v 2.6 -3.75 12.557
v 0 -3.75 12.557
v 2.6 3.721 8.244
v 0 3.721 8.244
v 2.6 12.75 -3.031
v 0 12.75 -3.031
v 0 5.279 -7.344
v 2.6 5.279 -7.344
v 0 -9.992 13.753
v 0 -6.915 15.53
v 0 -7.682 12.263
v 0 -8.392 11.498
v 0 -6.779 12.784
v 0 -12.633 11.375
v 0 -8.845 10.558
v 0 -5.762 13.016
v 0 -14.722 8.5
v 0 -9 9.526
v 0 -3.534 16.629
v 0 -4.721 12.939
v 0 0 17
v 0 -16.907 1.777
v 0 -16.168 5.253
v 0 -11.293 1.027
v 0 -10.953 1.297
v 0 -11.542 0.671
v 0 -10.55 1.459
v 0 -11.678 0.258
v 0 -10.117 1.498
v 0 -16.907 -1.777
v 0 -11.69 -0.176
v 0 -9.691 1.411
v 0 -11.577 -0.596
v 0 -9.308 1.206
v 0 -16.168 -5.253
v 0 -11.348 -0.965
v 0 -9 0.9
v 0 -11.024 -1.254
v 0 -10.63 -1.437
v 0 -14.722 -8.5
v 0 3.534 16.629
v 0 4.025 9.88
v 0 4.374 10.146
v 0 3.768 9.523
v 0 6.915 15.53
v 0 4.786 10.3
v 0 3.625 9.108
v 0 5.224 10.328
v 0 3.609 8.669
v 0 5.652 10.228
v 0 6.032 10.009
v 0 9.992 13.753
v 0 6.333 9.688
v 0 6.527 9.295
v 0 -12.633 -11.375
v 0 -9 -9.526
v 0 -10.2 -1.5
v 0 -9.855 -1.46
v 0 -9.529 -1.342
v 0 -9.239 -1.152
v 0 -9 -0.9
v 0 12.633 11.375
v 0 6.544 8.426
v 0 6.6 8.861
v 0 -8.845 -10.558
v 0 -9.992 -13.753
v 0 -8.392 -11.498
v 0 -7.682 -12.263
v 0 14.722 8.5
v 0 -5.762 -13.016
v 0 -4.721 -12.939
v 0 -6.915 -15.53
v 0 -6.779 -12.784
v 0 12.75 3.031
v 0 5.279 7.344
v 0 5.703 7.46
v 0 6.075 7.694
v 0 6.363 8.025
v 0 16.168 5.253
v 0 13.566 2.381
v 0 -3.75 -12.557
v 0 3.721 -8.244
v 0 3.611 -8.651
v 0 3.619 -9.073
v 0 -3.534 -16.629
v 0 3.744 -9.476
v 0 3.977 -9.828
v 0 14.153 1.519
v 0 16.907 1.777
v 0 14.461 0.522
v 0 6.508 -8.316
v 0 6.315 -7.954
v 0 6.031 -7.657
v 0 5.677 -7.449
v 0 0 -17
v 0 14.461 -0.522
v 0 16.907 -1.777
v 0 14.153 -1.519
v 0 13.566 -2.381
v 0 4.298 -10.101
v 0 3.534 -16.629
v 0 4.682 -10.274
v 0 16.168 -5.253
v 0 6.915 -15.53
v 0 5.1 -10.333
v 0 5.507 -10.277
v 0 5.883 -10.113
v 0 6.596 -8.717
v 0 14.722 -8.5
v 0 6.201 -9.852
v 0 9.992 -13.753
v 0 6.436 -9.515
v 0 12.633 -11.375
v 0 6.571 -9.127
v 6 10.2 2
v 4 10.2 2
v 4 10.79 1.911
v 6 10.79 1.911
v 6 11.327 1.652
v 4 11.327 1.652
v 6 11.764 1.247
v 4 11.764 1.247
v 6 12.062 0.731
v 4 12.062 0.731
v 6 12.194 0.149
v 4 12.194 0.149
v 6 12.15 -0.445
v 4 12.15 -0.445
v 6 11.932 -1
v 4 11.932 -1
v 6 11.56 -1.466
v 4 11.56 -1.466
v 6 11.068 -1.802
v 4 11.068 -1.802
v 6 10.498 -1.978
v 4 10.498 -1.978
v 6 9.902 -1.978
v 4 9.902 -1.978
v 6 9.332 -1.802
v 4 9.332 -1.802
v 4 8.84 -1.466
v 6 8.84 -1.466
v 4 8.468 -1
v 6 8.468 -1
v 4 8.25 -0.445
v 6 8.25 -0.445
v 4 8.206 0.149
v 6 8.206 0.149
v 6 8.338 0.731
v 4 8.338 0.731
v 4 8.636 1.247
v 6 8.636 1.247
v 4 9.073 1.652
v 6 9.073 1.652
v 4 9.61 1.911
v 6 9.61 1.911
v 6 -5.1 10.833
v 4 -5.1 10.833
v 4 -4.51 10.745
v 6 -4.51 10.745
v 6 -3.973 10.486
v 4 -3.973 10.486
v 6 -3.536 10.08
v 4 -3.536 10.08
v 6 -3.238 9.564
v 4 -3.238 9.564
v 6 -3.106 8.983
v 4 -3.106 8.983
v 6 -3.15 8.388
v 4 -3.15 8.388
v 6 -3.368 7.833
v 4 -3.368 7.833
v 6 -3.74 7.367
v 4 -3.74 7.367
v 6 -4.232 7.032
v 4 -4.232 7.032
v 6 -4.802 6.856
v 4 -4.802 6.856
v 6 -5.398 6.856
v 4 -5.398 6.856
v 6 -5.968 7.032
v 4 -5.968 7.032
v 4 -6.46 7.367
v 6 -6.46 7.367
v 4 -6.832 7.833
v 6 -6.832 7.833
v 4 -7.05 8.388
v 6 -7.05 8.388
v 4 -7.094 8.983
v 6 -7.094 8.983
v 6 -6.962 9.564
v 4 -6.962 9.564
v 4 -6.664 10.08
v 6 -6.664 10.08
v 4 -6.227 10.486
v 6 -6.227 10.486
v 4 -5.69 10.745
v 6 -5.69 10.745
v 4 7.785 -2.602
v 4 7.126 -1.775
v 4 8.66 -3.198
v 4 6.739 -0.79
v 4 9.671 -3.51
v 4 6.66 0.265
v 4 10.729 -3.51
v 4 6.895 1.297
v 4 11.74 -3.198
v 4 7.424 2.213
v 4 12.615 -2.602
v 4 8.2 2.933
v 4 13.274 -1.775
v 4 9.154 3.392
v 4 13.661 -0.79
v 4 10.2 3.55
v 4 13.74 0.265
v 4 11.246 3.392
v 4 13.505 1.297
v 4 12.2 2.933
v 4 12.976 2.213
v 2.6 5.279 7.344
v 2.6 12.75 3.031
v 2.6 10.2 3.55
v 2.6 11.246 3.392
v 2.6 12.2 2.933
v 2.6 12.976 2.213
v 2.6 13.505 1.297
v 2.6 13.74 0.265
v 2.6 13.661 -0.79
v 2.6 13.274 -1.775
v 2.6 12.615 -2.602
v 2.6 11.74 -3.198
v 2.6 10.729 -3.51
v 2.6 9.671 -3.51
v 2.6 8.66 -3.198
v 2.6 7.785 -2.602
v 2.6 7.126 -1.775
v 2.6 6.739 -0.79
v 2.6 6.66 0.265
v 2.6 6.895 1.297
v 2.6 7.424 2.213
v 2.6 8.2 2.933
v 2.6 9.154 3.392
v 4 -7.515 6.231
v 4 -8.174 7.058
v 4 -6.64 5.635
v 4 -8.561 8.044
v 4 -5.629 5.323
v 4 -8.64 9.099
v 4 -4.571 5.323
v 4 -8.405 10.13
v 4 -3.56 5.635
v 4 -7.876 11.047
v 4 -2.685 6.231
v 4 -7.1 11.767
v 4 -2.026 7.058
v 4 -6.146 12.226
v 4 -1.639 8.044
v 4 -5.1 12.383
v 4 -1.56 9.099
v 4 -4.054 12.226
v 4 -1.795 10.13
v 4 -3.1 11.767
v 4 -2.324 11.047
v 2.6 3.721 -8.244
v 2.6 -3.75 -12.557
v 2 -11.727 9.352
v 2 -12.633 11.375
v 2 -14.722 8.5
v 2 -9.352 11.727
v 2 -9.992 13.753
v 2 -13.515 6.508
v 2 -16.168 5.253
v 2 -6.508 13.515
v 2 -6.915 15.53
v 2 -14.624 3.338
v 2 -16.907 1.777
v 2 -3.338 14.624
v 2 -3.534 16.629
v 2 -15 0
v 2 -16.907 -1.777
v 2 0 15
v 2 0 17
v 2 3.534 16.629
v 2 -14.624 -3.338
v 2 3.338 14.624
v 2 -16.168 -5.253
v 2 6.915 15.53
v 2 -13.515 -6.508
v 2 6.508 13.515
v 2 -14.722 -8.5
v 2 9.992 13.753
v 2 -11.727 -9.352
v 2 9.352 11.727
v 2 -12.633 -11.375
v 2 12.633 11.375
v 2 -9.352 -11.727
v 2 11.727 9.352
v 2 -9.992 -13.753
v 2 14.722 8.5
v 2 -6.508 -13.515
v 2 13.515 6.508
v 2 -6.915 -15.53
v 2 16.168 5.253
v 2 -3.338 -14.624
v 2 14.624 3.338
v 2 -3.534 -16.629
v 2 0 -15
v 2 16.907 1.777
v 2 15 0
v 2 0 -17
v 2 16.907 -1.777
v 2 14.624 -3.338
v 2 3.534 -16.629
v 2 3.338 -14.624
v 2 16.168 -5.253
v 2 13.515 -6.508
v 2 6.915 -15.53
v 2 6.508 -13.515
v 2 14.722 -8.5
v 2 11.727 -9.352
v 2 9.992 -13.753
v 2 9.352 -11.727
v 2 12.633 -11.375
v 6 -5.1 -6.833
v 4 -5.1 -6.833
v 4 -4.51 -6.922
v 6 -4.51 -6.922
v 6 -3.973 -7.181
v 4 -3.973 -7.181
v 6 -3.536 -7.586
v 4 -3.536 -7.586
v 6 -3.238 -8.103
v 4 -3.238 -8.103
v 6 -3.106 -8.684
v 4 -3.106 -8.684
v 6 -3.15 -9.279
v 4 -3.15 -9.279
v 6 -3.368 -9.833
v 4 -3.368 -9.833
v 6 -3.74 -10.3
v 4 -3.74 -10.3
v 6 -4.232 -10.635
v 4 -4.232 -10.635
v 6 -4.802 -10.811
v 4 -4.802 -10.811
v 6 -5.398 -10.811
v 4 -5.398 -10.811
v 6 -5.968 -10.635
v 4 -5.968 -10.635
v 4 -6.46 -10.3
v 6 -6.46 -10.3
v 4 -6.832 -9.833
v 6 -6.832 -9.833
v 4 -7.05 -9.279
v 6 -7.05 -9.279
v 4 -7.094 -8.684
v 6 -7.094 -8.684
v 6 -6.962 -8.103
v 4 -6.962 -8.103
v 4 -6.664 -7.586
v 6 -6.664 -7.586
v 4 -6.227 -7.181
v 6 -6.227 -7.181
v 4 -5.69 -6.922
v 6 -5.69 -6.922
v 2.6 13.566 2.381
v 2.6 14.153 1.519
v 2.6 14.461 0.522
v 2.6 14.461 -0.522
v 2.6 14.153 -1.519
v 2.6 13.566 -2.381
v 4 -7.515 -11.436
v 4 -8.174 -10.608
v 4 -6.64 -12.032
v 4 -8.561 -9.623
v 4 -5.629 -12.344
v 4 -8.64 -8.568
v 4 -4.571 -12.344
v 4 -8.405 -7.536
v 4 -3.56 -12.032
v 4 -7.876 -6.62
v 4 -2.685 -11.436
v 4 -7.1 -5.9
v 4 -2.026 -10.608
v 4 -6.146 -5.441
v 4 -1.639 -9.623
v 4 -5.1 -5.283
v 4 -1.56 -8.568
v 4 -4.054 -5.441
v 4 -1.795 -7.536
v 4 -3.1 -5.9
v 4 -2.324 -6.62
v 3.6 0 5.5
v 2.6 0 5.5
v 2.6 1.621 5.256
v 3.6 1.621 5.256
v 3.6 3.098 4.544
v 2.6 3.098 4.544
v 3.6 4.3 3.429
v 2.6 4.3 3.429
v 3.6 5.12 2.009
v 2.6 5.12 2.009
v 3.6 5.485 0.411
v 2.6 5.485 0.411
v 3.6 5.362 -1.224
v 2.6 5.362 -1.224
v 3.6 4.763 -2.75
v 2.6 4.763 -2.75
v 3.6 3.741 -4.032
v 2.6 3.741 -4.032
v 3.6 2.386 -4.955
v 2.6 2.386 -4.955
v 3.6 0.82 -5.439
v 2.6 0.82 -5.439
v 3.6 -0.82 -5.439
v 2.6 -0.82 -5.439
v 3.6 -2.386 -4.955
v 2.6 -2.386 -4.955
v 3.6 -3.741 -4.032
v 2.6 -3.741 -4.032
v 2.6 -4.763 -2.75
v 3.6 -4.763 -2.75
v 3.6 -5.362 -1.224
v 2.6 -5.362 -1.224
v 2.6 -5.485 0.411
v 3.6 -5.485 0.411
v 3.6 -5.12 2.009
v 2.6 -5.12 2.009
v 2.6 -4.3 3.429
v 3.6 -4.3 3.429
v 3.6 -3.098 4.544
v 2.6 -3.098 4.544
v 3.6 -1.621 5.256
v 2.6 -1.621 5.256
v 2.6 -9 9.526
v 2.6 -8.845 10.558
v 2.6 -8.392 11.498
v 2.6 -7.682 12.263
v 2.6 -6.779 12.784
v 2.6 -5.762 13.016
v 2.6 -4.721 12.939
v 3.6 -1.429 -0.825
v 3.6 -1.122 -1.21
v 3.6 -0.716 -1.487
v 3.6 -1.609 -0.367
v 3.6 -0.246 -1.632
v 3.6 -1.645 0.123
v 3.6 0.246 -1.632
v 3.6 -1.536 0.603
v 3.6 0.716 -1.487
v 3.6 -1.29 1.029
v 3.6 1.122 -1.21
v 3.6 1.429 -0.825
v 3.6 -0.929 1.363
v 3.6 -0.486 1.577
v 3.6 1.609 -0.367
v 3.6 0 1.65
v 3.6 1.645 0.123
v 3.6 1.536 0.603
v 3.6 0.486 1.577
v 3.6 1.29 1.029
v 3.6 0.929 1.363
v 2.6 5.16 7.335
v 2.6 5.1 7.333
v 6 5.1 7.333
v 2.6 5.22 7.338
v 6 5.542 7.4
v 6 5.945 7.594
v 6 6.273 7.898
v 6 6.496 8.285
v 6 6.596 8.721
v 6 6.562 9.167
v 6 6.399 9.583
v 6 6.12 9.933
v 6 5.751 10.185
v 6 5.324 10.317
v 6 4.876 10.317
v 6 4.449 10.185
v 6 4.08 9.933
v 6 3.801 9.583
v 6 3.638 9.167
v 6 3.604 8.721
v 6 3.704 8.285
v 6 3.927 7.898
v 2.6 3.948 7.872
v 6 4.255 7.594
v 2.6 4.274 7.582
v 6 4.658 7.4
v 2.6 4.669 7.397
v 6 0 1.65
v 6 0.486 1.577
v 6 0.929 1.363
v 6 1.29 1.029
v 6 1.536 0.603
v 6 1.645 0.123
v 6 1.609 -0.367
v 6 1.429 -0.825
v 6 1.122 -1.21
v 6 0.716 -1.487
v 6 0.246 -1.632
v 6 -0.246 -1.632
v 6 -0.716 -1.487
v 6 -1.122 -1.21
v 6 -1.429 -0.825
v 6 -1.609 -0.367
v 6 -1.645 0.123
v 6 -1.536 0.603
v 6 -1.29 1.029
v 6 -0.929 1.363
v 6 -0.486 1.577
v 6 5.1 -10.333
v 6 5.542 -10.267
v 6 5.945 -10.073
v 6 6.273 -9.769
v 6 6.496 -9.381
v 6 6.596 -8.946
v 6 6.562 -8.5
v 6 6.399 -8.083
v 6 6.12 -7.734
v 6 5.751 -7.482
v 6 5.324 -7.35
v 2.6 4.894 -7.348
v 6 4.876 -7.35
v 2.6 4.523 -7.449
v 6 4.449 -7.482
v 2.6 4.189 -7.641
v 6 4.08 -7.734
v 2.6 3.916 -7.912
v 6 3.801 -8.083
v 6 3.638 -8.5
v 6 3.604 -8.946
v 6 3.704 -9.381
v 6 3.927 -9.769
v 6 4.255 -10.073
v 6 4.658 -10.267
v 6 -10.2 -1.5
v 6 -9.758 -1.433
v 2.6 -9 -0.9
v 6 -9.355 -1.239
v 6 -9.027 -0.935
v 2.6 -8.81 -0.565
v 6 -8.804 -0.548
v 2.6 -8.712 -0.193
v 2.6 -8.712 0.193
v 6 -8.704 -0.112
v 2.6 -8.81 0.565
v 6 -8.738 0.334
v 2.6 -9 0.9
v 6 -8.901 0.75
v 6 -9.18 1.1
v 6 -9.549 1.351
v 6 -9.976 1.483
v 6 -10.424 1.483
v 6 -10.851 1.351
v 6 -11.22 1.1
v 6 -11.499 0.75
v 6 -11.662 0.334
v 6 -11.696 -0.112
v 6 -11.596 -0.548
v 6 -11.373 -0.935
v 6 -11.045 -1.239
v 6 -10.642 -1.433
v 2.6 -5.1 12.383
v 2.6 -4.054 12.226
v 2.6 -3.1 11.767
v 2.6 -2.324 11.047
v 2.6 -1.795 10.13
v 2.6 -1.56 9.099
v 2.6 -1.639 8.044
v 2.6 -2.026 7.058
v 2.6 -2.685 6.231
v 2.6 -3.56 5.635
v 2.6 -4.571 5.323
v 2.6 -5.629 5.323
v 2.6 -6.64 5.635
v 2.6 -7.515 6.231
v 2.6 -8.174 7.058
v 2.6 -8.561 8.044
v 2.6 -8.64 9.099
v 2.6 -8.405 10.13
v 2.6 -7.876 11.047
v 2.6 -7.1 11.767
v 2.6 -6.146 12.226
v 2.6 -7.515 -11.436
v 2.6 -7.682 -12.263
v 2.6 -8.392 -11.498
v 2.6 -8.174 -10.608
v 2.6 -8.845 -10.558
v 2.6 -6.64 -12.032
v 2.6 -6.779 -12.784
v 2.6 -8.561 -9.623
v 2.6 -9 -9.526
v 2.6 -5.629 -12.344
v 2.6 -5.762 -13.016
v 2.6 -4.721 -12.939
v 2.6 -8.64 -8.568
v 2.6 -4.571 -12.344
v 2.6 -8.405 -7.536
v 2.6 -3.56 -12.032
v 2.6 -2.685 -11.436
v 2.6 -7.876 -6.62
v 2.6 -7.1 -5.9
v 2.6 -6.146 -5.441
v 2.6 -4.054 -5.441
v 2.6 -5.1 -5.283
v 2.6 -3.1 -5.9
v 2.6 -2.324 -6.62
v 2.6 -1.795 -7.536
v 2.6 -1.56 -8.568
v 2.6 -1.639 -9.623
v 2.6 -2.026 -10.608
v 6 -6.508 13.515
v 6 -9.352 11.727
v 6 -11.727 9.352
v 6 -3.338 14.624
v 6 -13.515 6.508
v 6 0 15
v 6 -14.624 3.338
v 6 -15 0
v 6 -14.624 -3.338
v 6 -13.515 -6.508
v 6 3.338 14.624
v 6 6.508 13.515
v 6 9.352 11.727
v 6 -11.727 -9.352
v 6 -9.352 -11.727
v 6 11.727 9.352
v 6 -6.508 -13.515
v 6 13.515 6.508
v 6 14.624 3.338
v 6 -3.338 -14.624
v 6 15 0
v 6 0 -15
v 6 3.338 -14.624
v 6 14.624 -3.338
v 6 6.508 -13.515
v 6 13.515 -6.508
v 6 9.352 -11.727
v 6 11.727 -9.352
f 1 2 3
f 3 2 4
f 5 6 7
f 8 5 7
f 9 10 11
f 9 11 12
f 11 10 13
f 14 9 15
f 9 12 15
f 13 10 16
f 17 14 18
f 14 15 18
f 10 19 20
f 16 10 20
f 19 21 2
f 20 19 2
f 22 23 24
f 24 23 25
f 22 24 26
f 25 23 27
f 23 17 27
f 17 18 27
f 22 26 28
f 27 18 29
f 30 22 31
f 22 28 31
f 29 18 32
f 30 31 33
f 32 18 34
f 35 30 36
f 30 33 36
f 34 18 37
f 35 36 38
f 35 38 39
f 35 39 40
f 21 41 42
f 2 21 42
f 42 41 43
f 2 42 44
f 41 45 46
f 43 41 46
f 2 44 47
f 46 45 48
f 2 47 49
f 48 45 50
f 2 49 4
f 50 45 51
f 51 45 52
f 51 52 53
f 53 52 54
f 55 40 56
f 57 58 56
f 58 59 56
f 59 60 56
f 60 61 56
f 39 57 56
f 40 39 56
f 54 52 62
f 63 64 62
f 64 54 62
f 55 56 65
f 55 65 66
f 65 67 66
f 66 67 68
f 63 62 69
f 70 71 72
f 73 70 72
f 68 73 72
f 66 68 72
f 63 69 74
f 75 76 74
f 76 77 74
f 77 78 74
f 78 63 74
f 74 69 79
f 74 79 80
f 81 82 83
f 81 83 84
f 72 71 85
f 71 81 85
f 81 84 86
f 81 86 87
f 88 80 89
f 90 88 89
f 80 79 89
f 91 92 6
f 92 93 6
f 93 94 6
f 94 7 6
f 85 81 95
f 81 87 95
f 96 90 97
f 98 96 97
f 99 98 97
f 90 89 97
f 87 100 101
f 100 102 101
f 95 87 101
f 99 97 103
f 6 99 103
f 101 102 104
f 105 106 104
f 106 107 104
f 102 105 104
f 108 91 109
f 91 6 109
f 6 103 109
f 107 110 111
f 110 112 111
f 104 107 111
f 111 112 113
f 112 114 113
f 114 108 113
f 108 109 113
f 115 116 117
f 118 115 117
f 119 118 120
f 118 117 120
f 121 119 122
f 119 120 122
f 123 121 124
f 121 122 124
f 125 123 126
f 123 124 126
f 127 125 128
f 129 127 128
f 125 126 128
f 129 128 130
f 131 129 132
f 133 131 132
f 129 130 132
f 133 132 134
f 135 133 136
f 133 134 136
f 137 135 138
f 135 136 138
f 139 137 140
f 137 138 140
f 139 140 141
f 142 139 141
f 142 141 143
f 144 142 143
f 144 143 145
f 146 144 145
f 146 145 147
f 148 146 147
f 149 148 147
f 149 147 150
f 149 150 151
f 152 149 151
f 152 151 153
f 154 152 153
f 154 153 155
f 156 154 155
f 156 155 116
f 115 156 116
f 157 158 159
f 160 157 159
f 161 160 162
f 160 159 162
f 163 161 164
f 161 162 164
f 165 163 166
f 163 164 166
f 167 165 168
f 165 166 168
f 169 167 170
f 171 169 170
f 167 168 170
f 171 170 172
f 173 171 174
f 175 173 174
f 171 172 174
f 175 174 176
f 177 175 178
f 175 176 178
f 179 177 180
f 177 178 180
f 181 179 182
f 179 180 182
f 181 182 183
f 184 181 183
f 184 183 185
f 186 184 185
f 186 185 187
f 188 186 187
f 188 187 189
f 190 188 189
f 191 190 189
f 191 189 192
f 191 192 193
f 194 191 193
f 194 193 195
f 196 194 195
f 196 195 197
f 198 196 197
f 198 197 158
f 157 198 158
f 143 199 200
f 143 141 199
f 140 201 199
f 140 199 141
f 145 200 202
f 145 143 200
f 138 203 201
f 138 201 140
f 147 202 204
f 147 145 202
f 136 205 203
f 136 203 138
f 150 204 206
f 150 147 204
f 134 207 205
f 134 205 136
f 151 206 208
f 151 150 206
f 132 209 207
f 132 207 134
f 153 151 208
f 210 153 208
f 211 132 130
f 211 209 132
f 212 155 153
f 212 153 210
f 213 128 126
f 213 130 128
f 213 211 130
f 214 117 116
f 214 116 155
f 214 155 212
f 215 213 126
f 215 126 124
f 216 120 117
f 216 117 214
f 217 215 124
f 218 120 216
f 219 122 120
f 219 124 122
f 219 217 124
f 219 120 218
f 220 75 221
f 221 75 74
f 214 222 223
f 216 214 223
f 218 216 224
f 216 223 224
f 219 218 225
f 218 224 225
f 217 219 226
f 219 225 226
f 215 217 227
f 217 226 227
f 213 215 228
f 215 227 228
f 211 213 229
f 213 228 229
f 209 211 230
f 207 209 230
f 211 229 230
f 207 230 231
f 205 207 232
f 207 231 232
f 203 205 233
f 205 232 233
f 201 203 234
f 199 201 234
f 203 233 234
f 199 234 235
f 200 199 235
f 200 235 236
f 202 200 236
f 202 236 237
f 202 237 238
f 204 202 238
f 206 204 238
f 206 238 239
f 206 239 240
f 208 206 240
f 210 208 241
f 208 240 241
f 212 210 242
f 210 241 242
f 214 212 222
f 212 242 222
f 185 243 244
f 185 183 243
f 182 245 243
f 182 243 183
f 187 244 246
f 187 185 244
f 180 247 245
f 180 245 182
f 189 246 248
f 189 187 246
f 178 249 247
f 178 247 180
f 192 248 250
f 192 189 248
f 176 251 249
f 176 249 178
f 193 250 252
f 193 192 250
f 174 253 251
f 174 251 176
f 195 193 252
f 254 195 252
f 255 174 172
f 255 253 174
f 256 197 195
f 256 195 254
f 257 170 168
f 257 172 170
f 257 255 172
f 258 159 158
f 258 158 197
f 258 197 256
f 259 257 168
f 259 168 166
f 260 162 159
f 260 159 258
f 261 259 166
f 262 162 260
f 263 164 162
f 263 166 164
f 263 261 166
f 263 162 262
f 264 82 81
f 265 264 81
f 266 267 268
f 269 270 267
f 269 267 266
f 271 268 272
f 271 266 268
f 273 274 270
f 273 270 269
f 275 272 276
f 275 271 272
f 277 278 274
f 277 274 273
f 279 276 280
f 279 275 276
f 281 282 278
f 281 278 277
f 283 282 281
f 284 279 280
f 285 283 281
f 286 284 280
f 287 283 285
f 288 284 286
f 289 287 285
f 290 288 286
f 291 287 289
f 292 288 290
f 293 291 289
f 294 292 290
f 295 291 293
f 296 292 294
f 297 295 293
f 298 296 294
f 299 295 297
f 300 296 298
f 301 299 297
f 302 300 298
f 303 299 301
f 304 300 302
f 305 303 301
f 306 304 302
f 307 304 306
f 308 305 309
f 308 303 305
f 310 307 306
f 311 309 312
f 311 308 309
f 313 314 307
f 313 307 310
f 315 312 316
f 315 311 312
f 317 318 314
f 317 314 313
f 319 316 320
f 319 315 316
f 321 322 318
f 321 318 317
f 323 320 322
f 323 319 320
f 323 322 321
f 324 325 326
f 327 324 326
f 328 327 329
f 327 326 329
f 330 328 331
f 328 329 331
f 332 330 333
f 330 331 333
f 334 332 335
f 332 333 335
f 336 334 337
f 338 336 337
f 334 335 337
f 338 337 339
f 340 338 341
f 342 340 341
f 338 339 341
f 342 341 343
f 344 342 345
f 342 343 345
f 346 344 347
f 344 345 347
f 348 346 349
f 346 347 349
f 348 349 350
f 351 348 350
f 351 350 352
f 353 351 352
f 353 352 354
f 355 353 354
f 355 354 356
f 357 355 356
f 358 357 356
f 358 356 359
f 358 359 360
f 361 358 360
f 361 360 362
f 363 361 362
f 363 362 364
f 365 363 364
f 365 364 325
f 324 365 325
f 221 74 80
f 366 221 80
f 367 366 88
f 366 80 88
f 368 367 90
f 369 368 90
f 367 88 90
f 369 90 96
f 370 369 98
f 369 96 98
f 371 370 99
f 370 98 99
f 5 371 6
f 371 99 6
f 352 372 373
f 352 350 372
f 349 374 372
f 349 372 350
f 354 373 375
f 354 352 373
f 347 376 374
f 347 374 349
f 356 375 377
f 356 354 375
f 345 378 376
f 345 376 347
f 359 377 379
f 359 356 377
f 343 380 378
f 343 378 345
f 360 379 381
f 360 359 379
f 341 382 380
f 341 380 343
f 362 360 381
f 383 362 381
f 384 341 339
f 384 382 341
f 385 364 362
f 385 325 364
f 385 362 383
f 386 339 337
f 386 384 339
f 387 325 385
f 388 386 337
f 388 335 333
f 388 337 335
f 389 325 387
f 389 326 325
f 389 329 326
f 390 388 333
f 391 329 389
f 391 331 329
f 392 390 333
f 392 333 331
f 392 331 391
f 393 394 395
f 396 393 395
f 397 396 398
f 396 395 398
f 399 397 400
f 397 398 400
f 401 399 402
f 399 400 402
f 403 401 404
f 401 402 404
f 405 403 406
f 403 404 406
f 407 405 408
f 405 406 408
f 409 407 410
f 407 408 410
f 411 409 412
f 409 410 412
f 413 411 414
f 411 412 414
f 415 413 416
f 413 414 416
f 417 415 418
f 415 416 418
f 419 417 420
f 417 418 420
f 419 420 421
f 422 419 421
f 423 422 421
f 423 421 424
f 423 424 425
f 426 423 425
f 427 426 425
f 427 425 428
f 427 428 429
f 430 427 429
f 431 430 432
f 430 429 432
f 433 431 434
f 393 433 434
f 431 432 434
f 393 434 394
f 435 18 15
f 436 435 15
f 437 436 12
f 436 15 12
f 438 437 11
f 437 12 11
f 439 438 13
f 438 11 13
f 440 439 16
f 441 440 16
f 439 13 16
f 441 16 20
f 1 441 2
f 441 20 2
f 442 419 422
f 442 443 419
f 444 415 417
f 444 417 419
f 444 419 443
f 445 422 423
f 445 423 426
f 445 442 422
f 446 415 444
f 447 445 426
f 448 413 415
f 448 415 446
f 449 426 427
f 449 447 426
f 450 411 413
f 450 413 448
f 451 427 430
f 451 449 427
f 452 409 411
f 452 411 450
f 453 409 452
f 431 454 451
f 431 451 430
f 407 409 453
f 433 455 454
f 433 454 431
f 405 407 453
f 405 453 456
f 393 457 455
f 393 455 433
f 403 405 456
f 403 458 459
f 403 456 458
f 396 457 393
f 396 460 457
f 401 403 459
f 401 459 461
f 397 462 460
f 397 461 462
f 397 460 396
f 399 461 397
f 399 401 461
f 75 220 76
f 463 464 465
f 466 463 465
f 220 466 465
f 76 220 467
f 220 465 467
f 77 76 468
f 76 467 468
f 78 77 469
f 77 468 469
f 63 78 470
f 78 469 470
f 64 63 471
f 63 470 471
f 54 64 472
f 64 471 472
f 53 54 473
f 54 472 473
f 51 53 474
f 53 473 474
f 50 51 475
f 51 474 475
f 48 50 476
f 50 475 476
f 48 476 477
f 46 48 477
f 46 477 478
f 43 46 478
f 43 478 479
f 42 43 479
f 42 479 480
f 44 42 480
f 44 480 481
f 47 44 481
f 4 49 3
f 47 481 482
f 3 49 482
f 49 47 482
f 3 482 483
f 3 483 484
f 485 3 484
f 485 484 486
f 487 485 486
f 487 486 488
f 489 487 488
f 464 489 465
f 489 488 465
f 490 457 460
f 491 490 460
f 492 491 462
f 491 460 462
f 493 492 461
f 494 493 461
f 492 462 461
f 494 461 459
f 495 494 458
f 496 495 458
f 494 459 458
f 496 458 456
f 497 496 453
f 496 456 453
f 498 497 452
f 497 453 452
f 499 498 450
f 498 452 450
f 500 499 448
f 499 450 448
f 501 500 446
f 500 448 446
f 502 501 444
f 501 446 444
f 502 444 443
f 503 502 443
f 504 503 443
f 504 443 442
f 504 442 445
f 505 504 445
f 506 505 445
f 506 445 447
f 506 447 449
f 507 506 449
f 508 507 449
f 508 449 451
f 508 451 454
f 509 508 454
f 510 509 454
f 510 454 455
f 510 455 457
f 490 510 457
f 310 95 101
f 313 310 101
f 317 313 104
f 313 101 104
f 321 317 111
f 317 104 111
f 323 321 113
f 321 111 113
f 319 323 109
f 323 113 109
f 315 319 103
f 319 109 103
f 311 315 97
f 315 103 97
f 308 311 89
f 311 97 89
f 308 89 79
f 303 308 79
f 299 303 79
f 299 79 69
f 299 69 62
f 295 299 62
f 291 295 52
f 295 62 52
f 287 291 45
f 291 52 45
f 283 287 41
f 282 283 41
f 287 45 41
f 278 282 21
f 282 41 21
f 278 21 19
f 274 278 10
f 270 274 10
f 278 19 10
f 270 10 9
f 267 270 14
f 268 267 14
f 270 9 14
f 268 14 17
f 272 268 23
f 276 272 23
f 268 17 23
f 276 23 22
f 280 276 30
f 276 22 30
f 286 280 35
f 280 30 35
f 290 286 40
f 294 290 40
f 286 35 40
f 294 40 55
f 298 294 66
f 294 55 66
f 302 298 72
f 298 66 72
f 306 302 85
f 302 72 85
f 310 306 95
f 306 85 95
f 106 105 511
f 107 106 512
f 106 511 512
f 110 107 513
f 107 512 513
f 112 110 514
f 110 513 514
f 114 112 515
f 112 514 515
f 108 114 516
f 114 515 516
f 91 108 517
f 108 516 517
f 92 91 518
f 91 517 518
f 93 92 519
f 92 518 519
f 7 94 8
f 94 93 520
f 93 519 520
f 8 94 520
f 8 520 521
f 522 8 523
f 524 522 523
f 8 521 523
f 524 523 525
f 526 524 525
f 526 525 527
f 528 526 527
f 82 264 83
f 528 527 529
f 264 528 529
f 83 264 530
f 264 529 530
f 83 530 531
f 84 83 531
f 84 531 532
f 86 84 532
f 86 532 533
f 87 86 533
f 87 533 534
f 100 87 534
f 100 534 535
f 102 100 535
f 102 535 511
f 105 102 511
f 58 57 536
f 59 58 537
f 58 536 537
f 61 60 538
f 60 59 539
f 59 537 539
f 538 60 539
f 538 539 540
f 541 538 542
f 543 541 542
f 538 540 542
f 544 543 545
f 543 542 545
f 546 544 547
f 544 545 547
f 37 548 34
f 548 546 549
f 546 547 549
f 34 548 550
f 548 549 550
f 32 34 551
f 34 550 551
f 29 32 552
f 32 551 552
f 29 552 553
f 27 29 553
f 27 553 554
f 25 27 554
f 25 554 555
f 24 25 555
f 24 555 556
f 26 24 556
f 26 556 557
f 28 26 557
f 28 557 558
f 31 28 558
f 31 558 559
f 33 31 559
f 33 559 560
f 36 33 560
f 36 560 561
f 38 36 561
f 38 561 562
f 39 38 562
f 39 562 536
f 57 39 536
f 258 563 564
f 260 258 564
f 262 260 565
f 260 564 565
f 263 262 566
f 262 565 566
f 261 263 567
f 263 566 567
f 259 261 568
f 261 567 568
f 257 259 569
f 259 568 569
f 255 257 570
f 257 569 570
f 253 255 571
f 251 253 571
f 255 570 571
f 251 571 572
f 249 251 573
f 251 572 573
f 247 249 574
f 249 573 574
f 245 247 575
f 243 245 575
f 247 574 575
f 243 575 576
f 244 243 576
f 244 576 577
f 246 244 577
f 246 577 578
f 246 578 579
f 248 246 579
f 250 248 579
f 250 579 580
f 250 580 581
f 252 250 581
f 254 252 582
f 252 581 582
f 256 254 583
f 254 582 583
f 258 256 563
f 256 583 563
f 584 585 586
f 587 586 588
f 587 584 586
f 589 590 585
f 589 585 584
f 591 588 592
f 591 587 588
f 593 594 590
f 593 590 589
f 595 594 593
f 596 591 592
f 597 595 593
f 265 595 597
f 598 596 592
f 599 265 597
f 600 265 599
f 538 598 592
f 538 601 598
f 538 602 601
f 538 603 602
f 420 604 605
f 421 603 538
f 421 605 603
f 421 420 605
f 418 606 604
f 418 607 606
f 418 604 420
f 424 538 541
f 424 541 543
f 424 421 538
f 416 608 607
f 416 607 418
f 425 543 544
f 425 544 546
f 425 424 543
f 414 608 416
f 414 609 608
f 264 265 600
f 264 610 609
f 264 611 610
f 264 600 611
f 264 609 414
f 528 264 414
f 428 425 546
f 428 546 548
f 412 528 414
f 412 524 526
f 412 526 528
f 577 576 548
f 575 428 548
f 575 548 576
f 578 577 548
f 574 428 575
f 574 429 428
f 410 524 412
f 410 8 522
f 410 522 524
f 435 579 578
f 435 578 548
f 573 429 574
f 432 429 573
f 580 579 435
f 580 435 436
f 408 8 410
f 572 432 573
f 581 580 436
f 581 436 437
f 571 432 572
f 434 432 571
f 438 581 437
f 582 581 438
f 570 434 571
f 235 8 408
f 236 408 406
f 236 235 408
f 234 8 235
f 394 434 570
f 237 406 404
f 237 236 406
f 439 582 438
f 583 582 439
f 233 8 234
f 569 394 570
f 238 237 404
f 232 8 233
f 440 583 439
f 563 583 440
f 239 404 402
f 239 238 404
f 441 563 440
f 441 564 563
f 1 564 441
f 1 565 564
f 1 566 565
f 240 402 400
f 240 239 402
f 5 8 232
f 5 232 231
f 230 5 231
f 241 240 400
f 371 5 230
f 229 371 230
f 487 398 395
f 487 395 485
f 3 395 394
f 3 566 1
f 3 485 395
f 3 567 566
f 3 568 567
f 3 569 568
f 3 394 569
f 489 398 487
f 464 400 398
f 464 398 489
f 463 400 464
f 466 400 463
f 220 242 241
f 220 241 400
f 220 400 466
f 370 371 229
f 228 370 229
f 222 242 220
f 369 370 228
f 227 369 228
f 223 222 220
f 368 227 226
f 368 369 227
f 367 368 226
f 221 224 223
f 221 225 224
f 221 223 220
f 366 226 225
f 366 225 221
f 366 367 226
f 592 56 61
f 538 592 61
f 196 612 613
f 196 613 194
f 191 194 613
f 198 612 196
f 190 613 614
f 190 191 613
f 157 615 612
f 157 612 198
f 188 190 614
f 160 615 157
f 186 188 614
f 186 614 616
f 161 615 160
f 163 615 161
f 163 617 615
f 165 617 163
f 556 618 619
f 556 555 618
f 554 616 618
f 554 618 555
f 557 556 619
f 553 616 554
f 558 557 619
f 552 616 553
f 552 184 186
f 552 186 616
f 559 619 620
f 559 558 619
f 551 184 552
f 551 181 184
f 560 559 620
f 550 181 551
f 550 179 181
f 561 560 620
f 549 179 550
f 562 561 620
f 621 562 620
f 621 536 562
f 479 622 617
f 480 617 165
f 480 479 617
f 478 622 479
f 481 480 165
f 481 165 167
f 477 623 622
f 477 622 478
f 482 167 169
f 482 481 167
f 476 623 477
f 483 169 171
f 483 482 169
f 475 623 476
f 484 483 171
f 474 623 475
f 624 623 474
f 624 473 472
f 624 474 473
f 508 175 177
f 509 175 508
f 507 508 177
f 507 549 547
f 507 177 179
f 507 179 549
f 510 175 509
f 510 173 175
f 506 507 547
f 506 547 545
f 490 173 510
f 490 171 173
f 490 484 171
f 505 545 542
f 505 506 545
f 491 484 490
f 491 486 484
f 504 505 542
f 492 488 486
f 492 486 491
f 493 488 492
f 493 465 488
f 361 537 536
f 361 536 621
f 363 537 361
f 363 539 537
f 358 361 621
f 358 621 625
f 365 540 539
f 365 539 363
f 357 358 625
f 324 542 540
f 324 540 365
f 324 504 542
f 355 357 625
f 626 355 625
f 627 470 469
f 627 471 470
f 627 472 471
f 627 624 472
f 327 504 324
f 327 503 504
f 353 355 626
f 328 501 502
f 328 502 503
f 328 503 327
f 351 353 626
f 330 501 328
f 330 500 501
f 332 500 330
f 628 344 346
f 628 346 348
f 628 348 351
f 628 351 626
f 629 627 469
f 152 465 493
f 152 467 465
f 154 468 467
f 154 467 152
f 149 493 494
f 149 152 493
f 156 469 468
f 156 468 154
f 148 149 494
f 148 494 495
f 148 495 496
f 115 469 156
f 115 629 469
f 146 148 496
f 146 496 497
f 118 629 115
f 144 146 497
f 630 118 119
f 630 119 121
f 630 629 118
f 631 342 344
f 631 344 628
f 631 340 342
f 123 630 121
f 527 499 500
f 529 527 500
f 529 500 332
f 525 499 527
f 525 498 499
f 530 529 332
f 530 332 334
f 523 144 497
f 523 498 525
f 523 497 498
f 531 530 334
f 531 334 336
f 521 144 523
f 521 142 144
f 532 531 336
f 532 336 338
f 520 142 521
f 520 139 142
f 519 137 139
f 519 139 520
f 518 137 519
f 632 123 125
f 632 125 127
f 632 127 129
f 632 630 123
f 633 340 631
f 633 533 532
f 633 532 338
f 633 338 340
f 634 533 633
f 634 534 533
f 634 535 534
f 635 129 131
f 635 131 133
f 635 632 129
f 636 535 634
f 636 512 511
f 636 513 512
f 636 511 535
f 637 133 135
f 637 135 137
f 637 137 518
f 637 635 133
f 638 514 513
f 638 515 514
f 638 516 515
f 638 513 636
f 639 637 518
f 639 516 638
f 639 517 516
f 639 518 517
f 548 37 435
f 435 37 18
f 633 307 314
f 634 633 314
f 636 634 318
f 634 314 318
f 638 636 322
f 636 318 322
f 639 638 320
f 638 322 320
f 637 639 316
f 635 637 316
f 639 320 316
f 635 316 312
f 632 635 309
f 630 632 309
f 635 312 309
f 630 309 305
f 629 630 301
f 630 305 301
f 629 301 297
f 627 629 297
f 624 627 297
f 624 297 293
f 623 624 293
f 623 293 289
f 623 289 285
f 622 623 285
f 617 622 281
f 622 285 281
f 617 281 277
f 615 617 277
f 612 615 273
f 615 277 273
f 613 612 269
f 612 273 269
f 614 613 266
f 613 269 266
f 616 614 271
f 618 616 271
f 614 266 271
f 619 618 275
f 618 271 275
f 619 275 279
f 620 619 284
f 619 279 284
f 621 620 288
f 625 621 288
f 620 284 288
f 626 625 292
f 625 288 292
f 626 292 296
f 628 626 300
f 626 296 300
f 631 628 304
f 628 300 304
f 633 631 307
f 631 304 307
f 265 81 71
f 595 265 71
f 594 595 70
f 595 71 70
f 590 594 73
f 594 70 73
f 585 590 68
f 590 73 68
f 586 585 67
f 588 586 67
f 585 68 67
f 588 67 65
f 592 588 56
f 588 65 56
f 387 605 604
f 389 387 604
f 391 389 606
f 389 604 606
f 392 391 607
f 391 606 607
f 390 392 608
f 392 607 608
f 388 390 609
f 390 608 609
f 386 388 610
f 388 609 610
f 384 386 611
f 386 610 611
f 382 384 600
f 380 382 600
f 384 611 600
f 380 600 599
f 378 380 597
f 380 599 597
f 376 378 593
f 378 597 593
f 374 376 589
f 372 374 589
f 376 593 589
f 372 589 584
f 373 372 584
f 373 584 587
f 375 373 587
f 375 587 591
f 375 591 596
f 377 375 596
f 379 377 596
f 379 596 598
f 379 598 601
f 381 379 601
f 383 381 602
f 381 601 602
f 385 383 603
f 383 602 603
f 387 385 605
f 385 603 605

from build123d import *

# Parameters (mm, degrees)
SKETCH_4_R          = 17
EXTRUDE_2_DEPTH     = 2
SKETCH_5_R          = 15
EXTRUDE_3_DEPTH     = 4
CUT_EXTRUDE_1_DEPTH = 2.6
SKETCH_7_R          = 3.55
CUT_EXTRUDE_2_DEPTH = 1.4
SKETCH_8_R          = 2
CUT_EXTRUDE_3_DEPTH = 25.280856657
SKETCH_9_R          = 5.5
CUT_EXTRUDE_4_DEPTH = 1
SKETCH_11_R         = 1.65
CUT_EXTRUDE_5_DEPTH = 25.309668858
SKETCH_13_R         = 1.5
CUT_EXTRUDE_6_DEPTH = 25.779023387


with BuildPart() as part:
    # 草图4 → 凸台-拉伸2 (new body)
    with BuildSketch(Plane(origin=(0, 0, 0), x_dir=(0, 0, -1), z_dir=(1, 0, 0))):
        Circle(SKETCH_4_R)
    extrude(amount=EXTRUDE_2_DEPTH)

    # 草图5 → 凸台-拉伸3 (add)
    with BuildSketch(Plane(origin=(2, 0, 0), x_dir=(0, 0, -1), z_dir=(1, 0, 0))):
        Circle(SKETCH_5_R)
    extrude(amount=EXTRUDE_3_DEPTH)

    # 草图6 → 切除-拉伸1 (cut)
    with BuildSketch(Plane.ZY):
        with BuildLine():
            Line((-3.031088913, 12.75), (-12.557368355, -3.75))
            ThreePointArc((-12.557368355, -3.75), (-12.557368355, -7.25), (-9.526279442, -9))
            Line((-9.526279442, -9), (9.526279442, -9))
            ThreePointArc((9.526279442, -9), (12.557368355, -7.25), (12.557368355, -3.75))
            Line((12.557368355, -3.75), (3.031088913, 12.75))
            ThreePointArc((3.031088913, 12.75), (0, 14.5), (-3.031088913, 12.75))
        make_face()
    extrude(amount=-CUT_EXTRUDE_1_DEPTH, mode=Mode.SUBTRACT)

    # 草图7 → 切除-拉伸2 (cut)
    with BuildSketch(Plane.ZY.offset(-2.6)):
        with Locations((0, 10.2)):
            Circle(SKETCH_7_R)
        with Locations((8.833459119, -5.1)):
            Circle(SKETCH_7_R)
        with Locations((-8.833459119, -5.1)):
            Circle(SKETCH_7_R)
    extrude(amount=-CUT_EXTRUDE_2_DEPTH, mode=Mode.SUBTRACT)

    # 草图8 → 切除-拉伸3 (cut, through all)
    with BuildSketch(Plane.ZY.offset(-2.6)):
        with Locations((0, 10.2)):
            Circle(SKETCH_8_R)
        with Locations((8.833459119, -5.1)):
            Circle(SKETCH_8_R)
        with Locations((-8.833459119, -5.1)):
            Circle(SKETCH_8_R)
    extrude(amount=-CUT_EXTRUDE_3_DEPTH, mode=Mode.SUBTRACT)

    # 草图9 → 切除-拉伸4 (cut)
    with BuildSketch(Plane.ZY.offset(-2.6)):
        Circle(SKETCH_9_R)
    extrude(amount=-CUT_EXTRUDE_4_DEPTH, mode=Mode.SUBTRACT)

    # 草图11 → 切除-拉伸5 (cut, through all)
    with BuildSketch(Plane.ZY.offset(-3.6)):
        Circle(SKETCH_11_R)
    extrude(amount=-CUT_EXTRUDE_5_DEPTH, mode=Mode.SUBTRACT)

    # 草图13 → 切除-拉伸6 (cut, through all)
    with BuildSketch(Plane(origin=(6, 0, 0), x_dir=(0, 0, -1), z_dir=(1, 0, 0))):
        with Locations((-8.833459119, 5.1)):
            Circle(SKETCH_13_R)
        with Locations((8.833459119, 5.1)):
            Circle(SKETCH_13_R)
        with Locations((0, -10.2)):
            Circle(SKETCH_13_R)
    extrude(amount=-CUT_EXTRUDE_6_DEPTH, mode=Mode.SUBTRACT)


solid = part.part
